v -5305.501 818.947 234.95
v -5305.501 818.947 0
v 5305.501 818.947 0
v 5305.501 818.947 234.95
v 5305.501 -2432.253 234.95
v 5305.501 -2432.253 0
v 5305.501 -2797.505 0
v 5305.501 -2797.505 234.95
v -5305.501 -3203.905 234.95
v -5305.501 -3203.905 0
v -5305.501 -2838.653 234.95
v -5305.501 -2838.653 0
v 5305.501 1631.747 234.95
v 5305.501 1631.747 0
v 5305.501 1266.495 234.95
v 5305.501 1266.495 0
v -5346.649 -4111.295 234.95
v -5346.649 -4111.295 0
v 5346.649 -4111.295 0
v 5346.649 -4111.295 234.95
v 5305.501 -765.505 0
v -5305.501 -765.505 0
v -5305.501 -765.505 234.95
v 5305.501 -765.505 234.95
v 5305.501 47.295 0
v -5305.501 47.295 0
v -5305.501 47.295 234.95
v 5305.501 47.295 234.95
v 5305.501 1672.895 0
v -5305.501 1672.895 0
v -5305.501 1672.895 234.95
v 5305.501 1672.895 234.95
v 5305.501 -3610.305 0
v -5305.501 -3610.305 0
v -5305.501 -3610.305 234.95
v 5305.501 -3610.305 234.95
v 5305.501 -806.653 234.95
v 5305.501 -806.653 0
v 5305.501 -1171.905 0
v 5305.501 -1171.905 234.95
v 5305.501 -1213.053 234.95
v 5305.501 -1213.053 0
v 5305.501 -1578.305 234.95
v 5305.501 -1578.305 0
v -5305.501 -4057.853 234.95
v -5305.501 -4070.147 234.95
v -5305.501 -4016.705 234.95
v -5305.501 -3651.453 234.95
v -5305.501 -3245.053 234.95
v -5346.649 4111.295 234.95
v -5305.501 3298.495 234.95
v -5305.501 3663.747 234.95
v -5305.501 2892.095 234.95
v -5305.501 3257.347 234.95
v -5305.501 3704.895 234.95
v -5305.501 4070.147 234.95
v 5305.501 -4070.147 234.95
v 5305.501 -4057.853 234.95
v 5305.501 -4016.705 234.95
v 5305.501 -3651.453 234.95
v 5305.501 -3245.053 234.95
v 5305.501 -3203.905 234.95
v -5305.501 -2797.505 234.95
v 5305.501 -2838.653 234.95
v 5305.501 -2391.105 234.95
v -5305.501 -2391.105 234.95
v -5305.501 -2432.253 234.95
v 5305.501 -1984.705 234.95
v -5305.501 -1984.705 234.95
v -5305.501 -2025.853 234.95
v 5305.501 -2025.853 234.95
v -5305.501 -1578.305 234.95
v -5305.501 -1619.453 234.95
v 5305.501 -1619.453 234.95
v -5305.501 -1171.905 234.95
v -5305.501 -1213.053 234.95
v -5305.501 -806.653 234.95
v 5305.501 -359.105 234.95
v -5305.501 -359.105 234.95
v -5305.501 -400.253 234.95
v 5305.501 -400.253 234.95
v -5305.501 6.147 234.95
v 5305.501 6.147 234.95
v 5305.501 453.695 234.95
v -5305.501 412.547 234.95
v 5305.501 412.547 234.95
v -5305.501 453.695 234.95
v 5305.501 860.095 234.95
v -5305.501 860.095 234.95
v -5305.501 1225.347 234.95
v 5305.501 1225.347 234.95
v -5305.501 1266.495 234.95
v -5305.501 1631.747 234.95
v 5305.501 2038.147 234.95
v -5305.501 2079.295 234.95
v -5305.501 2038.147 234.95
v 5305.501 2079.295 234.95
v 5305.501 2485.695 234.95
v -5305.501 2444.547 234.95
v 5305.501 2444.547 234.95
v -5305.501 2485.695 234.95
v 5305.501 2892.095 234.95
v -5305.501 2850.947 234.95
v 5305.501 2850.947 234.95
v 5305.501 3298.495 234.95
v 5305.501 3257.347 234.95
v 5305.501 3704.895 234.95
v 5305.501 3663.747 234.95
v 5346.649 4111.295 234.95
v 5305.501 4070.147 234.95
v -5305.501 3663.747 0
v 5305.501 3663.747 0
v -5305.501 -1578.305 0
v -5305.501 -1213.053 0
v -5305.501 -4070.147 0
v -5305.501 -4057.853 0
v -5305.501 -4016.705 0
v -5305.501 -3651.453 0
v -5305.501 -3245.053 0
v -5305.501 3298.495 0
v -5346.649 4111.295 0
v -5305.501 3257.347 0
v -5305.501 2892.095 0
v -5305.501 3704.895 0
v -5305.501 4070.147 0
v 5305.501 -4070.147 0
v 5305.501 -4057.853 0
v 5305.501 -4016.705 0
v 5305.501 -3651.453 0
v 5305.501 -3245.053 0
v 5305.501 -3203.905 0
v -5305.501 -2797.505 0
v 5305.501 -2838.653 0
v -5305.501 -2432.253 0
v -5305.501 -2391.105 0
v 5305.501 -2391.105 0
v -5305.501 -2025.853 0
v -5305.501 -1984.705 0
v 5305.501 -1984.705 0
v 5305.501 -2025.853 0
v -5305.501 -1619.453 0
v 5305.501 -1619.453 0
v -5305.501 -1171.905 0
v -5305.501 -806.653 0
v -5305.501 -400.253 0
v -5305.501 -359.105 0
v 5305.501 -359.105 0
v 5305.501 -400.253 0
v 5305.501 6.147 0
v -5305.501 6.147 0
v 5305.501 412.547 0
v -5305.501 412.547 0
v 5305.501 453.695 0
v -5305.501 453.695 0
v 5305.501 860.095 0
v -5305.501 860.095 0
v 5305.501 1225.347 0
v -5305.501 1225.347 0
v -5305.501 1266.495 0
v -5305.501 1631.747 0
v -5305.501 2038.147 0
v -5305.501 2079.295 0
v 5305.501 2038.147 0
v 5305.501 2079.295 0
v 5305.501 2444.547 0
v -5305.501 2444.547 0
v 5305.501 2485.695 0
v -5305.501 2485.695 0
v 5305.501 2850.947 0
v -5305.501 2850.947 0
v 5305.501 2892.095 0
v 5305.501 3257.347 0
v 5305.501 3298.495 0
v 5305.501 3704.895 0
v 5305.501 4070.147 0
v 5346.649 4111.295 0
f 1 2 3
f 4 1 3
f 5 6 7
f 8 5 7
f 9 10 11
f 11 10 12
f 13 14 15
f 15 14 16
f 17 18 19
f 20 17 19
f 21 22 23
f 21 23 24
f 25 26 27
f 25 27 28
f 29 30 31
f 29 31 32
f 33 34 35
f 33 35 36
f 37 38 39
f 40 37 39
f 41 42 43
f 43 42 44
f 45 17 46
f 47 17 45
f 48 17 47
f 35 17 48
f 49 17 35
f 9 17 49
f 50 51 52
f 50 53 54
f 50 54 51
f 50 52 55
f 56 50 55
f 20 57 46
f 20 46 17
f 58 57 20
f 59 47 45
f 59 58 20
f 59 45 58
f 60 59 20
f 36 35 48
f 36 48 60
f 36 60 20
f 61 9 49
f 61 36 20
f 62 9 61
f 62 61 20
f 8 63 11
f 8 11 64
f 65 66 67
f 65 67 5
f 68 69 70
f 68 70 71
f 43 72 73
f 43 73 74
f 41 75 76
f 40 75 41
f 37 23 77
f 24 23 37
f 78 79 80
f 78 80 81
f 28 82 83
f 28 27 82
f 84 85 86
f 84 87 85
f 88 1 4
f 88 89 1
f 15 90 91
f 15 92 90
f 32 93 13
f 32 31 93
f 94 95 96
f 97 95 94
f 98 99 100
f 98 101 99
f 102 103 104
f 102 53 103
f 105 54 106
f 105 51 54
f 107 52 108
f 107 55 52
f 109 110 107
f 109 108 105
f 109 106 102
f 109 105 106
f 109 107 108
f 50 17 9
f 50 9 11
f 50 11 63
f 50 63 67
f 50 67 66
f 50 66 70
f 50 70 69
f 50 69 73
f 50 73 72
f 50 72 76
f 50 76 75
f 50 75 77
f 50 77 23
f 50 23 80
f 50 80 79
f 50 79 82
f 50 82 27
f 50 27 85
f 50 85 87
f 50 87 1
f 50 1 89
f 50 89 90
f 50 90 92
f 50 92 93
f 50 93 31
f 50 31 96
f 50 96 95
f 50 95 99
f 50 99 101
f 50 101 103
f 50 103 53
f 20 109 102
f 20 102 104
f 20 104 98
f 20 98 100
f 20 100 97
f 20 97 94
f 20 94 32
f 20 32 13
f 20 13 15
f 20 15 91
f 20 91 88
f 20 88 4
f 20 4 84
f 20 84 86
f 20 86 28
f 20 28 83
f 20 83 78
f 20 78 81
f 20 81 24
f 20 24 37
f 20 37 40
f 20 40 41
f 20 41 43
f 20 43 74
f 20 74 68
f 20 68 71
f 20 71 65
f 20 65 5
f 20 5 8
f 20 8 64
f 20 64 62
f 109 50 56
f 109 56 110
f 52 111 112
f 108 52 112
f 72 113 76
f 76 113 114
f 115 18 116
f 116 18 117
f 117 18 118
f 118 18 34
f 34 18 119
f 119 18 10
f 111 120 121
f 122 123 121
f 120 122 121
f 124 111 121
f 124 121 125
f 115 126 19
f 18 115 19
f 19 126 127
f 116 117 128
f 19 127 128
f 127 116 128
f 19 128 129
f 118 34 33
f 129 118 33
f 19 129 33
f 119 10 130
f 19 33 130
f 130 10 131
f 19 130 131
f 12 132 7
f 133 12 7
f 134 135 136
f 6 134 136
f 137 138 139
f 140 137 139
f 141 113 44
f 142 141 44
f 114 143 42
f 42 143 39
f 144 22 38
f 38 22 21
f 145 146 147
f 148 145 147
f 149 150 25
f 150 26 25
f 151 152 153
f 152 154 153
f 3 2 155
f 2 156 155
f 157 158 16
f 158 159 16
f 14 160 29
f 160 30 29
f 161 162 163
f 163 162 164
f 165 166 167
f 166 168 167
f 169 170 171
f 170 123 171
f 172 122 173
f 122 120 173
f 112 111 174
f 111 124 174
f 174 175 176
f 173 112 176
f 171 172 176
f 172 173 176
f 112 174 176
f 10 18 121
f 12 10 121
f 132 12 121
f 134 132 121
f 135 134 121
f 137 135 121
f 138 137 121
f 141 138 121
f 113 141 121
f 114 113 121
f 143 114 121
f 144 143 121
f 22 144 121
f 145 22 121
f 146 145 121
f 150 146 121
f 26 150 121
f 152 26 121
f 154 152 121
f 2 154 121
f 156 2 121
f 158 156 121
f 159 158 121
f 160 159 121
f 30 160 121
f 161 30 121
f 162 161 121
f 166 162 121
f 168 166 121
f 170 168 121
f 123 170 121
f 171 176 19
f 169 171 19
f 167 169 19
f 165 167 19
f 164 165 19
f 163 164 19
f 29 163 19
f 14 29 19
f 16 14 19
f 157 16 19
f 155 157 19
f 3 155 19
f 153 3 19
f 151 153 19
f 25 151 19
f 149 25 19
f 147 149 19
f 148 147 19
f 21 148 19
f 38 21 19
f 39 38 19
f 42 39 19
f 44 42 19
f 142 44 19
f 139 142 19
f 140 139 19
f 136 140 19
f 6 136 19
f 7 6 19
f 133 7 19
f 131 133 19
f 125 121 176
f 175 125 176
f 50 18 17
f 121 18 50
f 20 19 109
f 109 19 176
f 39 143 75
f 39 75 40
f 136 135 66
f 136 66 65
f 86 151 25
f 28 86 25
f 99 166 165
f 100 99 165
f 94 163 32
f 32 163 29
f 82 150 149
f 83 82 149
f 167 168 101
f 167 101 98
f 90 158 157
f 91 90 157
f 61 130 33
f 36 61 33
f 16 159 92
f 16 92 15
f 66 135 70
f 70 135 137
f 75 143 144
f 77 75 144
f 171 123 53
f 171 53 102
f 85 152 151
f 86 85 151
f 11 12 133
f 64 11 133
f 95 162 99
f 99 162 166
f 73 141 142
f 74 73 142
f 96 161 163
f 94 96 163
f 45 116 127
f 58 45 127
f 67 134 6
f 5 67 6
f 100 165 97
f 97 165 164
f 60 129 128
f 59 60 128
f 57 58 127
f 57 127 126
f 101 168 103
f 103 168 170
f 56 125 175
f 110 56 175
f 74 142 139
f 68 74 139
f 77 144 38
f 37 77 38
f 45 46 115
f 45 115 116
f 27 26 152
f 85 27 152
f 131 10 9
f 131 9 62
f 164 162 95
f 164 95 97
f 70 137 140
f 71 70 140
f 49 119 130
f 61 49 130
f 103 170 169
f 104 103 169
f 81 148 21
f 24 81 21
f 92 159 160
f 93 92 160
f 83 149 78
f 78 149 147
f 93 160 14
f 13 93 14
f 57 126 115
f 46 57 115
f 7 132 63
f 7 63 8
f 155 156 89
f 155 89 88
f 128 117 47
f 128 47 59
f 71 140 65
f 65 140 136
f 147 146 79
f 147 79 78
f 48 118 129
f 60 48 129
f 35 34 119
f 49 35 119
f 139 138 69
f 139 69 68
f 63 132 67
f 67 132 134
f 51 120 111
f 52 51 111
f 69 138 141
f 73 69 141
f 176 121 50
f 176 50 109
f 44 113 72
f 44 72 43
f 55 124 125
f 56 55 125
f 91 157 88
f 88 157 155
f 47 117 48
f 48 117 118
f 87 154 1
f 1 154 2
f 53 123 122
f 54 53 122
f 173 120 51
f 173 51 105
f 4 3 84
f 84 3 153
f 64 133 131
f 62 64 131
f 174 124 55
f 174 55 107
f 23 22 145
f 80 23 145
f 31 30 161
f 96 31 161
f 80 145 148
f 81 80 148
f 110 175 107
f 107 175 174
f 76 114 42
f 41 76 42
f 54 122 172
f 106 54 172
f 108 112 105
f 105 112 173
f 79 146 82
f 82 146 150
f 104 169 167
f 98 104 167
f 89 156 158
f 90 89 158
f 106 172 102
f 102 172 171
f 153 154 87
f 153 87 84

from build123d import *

# Parameters (mm, degrees)
F0_W     = 10693.2984
F0_H     = 8222.5896
F0_W_2   = 10611.0024
F0_H_2   = 41.148
F1_DEPTH = 234.95


with BuildPart() as f1:
    # F0 (on Top) → F1 (new body)
    with BuildSketch(Plane.XY):
        Rectangle(F0_W, F0_H)
        Polygon((5305.5012, -4057.8532), (5305.5012, -4070.1468), (-5305.5012, -4070.1468), (-5305.5012, -4057.8532), (-5305.5012, -4016.7052), (-5305.5012, -3651.4532), (-5305.5012, -3610.3052), (-5305.5012, -3245.0532), (-5305.5012, -3203.9052), (-5305.5012, -2838.6532), (-5305.5012, -2797.5052), (-5305.5012, -2432.2532), (-5305.5012, -2391.1052), (-5305.5012, -2025.8532), (-5305.5012, -1984.7052), (-5305.5012, -1619.4532), (-5305.5012, -1578.3052), (-5305.5012, -1213.0532), (-5305.5012, -1171.9052), (-5305.5012, -806.6532), (-5305.5012, -765.5052), (-5305.5012, -400.2532), (-5305.5012, -359.1052), (-5305.5012, 6.1468), (-5305.5012, 47.2948), (-5305.5012, 412.5468), (-5305.5012, 453.6948), (-5305.5012, 818.9468), (-5305.5012, 860.0948), (-5305.5012, 1225.3468), (-5305.5012, 1266.4948), (-5305.5012, 1631.7468), (-5305.5012, 1672.8948), (-5305.5012, 2038.1468), (-5305.5012, 2079.2948), (-5305.5012, 2444.5468), (-5305.5012, 2485.6948), (-5305.5012, 2850.9468), (-5305.5012, 2892.0948), (-5305.5012, 3257.3468), (-5305.5012, 3298.4948), (-5305.5012, 3663.7468), (-5305.5012, 3704.8948), (-5305.5012, 4070.1468), (5305.5012, 4070.1468), (5305.5012, 3704.8948), (5305.5012, 3663.7468), (5305.5012, 3298.4948), (5305.5012, 3257.3468), (5305.5012, 2892.0948), (5305.5012, 2850.9468), (5305.5012, 2485.6948), (5305.5012, 2444.5468), (5305.5012, 2079.2948), (5305.5012, 2038.1468), (5305.5012, 1672.8948), (5305.5012, 1631.7468), (5305.5012, 1266.4948), (5305.5012, 1225.3468), (5305.5012, 860.0948), (5305.5012, 818.9468), (5305.5012, 453.6948), (5305.5012, 412.5468), (5305.5012, 47.2948), (5305.5012, 6.1468), (5305.5012, -359.1052), (5305.5012, -400.2532), (5305.5012, -765.5052), (5305.5012, -806.6532), (5305.5012, -1171.9052), (5305.5012, -1213.0532), (5305.5012, -1578.3052), (5305.5012, -1619.4532), (5305.5012, -1984.7052), (5305.5012, -2025.8532), (5305.5012, -2391.1052), (5305.5012, -2432.2532), (5305.5012, -2797.5052), (5305.5012, -2838.6532), (5305.5012, -3203.9052), (5305.5012, -3245.0532), (5305.5012, -3610.3052), (5305.5012, -3651.4532), (5305.5012, -4016.7052), align=None, mode=Mode.SUBTRACT)
        with Locations((0, 3684.3208)):
            Rectangle(F0_W_2, F0_H_2)
        with Locations((0, 3277.9208)):
            Rectangle(F0_W_2, F0_H_2)
        with Locations((0, 2871.5208)):
            Rectangle(F0_W_2, F0_H_2)
        with Locations((0, 2465.1208)):
            Rectangle(F0_W_2, F0_H_2)
        with Locations((0, 2058.7208)):
            Rectangle(F0_W_2, F0_H_2)
        with Locations((0, 1652.3208)):
            Rectangle(F0_W_2, F0_H_2)
        with Locations((0, 1245.9208)):
            Rectangle(F0_W_2, F0_H_2)
        with Locations((0, 839.5208)):
            Rectangle(F0_W_2, F0_H_2)
        with Locations((0, 433.1208)):
            Rectangle(F0_W_2, F0_H_2)
        with Locations((0, 26.7208)):
            Rectangle(F0_W_2, F0_H_2)
        with Locations((0, -379.6792)):
            Rectangle(F0_W_2, F0_H_2)
        with Locations((0, -786.0792)):
            Rectangle(F0_W_2, F0_H_2)
        with Locations((0, -1192.4792)):
            Rectangle(F0_W_2, F0_H_2)
        with Locations((0, -1598.8792)):
            Rectangle(F0_W_2, F0_H_2)
        with Locations((0, -2005.2792)):
            Rectangle(F0_W_2, F0_H_2)
        with Locations((0, -2411.6792)):
            Rectangle(F0_W_2, F0_H_2)
        with Locations((0, -2818.0792)):
            Rectangle(F0_W_2, F0_H_2)
        with Locations((0, -3224.4792)):
            Rectangle(F0_W_2, F0_H_2)
        with Locations((0, -3630.8792)):
            Rectangle(F0_W_2, F0_H_2)
        with Locations((0, -4037.2792)):
            Rectangle(F0_W_2, F0_H_2)
    extrude(amount=F1_DEPTH)


solid = f1.part
